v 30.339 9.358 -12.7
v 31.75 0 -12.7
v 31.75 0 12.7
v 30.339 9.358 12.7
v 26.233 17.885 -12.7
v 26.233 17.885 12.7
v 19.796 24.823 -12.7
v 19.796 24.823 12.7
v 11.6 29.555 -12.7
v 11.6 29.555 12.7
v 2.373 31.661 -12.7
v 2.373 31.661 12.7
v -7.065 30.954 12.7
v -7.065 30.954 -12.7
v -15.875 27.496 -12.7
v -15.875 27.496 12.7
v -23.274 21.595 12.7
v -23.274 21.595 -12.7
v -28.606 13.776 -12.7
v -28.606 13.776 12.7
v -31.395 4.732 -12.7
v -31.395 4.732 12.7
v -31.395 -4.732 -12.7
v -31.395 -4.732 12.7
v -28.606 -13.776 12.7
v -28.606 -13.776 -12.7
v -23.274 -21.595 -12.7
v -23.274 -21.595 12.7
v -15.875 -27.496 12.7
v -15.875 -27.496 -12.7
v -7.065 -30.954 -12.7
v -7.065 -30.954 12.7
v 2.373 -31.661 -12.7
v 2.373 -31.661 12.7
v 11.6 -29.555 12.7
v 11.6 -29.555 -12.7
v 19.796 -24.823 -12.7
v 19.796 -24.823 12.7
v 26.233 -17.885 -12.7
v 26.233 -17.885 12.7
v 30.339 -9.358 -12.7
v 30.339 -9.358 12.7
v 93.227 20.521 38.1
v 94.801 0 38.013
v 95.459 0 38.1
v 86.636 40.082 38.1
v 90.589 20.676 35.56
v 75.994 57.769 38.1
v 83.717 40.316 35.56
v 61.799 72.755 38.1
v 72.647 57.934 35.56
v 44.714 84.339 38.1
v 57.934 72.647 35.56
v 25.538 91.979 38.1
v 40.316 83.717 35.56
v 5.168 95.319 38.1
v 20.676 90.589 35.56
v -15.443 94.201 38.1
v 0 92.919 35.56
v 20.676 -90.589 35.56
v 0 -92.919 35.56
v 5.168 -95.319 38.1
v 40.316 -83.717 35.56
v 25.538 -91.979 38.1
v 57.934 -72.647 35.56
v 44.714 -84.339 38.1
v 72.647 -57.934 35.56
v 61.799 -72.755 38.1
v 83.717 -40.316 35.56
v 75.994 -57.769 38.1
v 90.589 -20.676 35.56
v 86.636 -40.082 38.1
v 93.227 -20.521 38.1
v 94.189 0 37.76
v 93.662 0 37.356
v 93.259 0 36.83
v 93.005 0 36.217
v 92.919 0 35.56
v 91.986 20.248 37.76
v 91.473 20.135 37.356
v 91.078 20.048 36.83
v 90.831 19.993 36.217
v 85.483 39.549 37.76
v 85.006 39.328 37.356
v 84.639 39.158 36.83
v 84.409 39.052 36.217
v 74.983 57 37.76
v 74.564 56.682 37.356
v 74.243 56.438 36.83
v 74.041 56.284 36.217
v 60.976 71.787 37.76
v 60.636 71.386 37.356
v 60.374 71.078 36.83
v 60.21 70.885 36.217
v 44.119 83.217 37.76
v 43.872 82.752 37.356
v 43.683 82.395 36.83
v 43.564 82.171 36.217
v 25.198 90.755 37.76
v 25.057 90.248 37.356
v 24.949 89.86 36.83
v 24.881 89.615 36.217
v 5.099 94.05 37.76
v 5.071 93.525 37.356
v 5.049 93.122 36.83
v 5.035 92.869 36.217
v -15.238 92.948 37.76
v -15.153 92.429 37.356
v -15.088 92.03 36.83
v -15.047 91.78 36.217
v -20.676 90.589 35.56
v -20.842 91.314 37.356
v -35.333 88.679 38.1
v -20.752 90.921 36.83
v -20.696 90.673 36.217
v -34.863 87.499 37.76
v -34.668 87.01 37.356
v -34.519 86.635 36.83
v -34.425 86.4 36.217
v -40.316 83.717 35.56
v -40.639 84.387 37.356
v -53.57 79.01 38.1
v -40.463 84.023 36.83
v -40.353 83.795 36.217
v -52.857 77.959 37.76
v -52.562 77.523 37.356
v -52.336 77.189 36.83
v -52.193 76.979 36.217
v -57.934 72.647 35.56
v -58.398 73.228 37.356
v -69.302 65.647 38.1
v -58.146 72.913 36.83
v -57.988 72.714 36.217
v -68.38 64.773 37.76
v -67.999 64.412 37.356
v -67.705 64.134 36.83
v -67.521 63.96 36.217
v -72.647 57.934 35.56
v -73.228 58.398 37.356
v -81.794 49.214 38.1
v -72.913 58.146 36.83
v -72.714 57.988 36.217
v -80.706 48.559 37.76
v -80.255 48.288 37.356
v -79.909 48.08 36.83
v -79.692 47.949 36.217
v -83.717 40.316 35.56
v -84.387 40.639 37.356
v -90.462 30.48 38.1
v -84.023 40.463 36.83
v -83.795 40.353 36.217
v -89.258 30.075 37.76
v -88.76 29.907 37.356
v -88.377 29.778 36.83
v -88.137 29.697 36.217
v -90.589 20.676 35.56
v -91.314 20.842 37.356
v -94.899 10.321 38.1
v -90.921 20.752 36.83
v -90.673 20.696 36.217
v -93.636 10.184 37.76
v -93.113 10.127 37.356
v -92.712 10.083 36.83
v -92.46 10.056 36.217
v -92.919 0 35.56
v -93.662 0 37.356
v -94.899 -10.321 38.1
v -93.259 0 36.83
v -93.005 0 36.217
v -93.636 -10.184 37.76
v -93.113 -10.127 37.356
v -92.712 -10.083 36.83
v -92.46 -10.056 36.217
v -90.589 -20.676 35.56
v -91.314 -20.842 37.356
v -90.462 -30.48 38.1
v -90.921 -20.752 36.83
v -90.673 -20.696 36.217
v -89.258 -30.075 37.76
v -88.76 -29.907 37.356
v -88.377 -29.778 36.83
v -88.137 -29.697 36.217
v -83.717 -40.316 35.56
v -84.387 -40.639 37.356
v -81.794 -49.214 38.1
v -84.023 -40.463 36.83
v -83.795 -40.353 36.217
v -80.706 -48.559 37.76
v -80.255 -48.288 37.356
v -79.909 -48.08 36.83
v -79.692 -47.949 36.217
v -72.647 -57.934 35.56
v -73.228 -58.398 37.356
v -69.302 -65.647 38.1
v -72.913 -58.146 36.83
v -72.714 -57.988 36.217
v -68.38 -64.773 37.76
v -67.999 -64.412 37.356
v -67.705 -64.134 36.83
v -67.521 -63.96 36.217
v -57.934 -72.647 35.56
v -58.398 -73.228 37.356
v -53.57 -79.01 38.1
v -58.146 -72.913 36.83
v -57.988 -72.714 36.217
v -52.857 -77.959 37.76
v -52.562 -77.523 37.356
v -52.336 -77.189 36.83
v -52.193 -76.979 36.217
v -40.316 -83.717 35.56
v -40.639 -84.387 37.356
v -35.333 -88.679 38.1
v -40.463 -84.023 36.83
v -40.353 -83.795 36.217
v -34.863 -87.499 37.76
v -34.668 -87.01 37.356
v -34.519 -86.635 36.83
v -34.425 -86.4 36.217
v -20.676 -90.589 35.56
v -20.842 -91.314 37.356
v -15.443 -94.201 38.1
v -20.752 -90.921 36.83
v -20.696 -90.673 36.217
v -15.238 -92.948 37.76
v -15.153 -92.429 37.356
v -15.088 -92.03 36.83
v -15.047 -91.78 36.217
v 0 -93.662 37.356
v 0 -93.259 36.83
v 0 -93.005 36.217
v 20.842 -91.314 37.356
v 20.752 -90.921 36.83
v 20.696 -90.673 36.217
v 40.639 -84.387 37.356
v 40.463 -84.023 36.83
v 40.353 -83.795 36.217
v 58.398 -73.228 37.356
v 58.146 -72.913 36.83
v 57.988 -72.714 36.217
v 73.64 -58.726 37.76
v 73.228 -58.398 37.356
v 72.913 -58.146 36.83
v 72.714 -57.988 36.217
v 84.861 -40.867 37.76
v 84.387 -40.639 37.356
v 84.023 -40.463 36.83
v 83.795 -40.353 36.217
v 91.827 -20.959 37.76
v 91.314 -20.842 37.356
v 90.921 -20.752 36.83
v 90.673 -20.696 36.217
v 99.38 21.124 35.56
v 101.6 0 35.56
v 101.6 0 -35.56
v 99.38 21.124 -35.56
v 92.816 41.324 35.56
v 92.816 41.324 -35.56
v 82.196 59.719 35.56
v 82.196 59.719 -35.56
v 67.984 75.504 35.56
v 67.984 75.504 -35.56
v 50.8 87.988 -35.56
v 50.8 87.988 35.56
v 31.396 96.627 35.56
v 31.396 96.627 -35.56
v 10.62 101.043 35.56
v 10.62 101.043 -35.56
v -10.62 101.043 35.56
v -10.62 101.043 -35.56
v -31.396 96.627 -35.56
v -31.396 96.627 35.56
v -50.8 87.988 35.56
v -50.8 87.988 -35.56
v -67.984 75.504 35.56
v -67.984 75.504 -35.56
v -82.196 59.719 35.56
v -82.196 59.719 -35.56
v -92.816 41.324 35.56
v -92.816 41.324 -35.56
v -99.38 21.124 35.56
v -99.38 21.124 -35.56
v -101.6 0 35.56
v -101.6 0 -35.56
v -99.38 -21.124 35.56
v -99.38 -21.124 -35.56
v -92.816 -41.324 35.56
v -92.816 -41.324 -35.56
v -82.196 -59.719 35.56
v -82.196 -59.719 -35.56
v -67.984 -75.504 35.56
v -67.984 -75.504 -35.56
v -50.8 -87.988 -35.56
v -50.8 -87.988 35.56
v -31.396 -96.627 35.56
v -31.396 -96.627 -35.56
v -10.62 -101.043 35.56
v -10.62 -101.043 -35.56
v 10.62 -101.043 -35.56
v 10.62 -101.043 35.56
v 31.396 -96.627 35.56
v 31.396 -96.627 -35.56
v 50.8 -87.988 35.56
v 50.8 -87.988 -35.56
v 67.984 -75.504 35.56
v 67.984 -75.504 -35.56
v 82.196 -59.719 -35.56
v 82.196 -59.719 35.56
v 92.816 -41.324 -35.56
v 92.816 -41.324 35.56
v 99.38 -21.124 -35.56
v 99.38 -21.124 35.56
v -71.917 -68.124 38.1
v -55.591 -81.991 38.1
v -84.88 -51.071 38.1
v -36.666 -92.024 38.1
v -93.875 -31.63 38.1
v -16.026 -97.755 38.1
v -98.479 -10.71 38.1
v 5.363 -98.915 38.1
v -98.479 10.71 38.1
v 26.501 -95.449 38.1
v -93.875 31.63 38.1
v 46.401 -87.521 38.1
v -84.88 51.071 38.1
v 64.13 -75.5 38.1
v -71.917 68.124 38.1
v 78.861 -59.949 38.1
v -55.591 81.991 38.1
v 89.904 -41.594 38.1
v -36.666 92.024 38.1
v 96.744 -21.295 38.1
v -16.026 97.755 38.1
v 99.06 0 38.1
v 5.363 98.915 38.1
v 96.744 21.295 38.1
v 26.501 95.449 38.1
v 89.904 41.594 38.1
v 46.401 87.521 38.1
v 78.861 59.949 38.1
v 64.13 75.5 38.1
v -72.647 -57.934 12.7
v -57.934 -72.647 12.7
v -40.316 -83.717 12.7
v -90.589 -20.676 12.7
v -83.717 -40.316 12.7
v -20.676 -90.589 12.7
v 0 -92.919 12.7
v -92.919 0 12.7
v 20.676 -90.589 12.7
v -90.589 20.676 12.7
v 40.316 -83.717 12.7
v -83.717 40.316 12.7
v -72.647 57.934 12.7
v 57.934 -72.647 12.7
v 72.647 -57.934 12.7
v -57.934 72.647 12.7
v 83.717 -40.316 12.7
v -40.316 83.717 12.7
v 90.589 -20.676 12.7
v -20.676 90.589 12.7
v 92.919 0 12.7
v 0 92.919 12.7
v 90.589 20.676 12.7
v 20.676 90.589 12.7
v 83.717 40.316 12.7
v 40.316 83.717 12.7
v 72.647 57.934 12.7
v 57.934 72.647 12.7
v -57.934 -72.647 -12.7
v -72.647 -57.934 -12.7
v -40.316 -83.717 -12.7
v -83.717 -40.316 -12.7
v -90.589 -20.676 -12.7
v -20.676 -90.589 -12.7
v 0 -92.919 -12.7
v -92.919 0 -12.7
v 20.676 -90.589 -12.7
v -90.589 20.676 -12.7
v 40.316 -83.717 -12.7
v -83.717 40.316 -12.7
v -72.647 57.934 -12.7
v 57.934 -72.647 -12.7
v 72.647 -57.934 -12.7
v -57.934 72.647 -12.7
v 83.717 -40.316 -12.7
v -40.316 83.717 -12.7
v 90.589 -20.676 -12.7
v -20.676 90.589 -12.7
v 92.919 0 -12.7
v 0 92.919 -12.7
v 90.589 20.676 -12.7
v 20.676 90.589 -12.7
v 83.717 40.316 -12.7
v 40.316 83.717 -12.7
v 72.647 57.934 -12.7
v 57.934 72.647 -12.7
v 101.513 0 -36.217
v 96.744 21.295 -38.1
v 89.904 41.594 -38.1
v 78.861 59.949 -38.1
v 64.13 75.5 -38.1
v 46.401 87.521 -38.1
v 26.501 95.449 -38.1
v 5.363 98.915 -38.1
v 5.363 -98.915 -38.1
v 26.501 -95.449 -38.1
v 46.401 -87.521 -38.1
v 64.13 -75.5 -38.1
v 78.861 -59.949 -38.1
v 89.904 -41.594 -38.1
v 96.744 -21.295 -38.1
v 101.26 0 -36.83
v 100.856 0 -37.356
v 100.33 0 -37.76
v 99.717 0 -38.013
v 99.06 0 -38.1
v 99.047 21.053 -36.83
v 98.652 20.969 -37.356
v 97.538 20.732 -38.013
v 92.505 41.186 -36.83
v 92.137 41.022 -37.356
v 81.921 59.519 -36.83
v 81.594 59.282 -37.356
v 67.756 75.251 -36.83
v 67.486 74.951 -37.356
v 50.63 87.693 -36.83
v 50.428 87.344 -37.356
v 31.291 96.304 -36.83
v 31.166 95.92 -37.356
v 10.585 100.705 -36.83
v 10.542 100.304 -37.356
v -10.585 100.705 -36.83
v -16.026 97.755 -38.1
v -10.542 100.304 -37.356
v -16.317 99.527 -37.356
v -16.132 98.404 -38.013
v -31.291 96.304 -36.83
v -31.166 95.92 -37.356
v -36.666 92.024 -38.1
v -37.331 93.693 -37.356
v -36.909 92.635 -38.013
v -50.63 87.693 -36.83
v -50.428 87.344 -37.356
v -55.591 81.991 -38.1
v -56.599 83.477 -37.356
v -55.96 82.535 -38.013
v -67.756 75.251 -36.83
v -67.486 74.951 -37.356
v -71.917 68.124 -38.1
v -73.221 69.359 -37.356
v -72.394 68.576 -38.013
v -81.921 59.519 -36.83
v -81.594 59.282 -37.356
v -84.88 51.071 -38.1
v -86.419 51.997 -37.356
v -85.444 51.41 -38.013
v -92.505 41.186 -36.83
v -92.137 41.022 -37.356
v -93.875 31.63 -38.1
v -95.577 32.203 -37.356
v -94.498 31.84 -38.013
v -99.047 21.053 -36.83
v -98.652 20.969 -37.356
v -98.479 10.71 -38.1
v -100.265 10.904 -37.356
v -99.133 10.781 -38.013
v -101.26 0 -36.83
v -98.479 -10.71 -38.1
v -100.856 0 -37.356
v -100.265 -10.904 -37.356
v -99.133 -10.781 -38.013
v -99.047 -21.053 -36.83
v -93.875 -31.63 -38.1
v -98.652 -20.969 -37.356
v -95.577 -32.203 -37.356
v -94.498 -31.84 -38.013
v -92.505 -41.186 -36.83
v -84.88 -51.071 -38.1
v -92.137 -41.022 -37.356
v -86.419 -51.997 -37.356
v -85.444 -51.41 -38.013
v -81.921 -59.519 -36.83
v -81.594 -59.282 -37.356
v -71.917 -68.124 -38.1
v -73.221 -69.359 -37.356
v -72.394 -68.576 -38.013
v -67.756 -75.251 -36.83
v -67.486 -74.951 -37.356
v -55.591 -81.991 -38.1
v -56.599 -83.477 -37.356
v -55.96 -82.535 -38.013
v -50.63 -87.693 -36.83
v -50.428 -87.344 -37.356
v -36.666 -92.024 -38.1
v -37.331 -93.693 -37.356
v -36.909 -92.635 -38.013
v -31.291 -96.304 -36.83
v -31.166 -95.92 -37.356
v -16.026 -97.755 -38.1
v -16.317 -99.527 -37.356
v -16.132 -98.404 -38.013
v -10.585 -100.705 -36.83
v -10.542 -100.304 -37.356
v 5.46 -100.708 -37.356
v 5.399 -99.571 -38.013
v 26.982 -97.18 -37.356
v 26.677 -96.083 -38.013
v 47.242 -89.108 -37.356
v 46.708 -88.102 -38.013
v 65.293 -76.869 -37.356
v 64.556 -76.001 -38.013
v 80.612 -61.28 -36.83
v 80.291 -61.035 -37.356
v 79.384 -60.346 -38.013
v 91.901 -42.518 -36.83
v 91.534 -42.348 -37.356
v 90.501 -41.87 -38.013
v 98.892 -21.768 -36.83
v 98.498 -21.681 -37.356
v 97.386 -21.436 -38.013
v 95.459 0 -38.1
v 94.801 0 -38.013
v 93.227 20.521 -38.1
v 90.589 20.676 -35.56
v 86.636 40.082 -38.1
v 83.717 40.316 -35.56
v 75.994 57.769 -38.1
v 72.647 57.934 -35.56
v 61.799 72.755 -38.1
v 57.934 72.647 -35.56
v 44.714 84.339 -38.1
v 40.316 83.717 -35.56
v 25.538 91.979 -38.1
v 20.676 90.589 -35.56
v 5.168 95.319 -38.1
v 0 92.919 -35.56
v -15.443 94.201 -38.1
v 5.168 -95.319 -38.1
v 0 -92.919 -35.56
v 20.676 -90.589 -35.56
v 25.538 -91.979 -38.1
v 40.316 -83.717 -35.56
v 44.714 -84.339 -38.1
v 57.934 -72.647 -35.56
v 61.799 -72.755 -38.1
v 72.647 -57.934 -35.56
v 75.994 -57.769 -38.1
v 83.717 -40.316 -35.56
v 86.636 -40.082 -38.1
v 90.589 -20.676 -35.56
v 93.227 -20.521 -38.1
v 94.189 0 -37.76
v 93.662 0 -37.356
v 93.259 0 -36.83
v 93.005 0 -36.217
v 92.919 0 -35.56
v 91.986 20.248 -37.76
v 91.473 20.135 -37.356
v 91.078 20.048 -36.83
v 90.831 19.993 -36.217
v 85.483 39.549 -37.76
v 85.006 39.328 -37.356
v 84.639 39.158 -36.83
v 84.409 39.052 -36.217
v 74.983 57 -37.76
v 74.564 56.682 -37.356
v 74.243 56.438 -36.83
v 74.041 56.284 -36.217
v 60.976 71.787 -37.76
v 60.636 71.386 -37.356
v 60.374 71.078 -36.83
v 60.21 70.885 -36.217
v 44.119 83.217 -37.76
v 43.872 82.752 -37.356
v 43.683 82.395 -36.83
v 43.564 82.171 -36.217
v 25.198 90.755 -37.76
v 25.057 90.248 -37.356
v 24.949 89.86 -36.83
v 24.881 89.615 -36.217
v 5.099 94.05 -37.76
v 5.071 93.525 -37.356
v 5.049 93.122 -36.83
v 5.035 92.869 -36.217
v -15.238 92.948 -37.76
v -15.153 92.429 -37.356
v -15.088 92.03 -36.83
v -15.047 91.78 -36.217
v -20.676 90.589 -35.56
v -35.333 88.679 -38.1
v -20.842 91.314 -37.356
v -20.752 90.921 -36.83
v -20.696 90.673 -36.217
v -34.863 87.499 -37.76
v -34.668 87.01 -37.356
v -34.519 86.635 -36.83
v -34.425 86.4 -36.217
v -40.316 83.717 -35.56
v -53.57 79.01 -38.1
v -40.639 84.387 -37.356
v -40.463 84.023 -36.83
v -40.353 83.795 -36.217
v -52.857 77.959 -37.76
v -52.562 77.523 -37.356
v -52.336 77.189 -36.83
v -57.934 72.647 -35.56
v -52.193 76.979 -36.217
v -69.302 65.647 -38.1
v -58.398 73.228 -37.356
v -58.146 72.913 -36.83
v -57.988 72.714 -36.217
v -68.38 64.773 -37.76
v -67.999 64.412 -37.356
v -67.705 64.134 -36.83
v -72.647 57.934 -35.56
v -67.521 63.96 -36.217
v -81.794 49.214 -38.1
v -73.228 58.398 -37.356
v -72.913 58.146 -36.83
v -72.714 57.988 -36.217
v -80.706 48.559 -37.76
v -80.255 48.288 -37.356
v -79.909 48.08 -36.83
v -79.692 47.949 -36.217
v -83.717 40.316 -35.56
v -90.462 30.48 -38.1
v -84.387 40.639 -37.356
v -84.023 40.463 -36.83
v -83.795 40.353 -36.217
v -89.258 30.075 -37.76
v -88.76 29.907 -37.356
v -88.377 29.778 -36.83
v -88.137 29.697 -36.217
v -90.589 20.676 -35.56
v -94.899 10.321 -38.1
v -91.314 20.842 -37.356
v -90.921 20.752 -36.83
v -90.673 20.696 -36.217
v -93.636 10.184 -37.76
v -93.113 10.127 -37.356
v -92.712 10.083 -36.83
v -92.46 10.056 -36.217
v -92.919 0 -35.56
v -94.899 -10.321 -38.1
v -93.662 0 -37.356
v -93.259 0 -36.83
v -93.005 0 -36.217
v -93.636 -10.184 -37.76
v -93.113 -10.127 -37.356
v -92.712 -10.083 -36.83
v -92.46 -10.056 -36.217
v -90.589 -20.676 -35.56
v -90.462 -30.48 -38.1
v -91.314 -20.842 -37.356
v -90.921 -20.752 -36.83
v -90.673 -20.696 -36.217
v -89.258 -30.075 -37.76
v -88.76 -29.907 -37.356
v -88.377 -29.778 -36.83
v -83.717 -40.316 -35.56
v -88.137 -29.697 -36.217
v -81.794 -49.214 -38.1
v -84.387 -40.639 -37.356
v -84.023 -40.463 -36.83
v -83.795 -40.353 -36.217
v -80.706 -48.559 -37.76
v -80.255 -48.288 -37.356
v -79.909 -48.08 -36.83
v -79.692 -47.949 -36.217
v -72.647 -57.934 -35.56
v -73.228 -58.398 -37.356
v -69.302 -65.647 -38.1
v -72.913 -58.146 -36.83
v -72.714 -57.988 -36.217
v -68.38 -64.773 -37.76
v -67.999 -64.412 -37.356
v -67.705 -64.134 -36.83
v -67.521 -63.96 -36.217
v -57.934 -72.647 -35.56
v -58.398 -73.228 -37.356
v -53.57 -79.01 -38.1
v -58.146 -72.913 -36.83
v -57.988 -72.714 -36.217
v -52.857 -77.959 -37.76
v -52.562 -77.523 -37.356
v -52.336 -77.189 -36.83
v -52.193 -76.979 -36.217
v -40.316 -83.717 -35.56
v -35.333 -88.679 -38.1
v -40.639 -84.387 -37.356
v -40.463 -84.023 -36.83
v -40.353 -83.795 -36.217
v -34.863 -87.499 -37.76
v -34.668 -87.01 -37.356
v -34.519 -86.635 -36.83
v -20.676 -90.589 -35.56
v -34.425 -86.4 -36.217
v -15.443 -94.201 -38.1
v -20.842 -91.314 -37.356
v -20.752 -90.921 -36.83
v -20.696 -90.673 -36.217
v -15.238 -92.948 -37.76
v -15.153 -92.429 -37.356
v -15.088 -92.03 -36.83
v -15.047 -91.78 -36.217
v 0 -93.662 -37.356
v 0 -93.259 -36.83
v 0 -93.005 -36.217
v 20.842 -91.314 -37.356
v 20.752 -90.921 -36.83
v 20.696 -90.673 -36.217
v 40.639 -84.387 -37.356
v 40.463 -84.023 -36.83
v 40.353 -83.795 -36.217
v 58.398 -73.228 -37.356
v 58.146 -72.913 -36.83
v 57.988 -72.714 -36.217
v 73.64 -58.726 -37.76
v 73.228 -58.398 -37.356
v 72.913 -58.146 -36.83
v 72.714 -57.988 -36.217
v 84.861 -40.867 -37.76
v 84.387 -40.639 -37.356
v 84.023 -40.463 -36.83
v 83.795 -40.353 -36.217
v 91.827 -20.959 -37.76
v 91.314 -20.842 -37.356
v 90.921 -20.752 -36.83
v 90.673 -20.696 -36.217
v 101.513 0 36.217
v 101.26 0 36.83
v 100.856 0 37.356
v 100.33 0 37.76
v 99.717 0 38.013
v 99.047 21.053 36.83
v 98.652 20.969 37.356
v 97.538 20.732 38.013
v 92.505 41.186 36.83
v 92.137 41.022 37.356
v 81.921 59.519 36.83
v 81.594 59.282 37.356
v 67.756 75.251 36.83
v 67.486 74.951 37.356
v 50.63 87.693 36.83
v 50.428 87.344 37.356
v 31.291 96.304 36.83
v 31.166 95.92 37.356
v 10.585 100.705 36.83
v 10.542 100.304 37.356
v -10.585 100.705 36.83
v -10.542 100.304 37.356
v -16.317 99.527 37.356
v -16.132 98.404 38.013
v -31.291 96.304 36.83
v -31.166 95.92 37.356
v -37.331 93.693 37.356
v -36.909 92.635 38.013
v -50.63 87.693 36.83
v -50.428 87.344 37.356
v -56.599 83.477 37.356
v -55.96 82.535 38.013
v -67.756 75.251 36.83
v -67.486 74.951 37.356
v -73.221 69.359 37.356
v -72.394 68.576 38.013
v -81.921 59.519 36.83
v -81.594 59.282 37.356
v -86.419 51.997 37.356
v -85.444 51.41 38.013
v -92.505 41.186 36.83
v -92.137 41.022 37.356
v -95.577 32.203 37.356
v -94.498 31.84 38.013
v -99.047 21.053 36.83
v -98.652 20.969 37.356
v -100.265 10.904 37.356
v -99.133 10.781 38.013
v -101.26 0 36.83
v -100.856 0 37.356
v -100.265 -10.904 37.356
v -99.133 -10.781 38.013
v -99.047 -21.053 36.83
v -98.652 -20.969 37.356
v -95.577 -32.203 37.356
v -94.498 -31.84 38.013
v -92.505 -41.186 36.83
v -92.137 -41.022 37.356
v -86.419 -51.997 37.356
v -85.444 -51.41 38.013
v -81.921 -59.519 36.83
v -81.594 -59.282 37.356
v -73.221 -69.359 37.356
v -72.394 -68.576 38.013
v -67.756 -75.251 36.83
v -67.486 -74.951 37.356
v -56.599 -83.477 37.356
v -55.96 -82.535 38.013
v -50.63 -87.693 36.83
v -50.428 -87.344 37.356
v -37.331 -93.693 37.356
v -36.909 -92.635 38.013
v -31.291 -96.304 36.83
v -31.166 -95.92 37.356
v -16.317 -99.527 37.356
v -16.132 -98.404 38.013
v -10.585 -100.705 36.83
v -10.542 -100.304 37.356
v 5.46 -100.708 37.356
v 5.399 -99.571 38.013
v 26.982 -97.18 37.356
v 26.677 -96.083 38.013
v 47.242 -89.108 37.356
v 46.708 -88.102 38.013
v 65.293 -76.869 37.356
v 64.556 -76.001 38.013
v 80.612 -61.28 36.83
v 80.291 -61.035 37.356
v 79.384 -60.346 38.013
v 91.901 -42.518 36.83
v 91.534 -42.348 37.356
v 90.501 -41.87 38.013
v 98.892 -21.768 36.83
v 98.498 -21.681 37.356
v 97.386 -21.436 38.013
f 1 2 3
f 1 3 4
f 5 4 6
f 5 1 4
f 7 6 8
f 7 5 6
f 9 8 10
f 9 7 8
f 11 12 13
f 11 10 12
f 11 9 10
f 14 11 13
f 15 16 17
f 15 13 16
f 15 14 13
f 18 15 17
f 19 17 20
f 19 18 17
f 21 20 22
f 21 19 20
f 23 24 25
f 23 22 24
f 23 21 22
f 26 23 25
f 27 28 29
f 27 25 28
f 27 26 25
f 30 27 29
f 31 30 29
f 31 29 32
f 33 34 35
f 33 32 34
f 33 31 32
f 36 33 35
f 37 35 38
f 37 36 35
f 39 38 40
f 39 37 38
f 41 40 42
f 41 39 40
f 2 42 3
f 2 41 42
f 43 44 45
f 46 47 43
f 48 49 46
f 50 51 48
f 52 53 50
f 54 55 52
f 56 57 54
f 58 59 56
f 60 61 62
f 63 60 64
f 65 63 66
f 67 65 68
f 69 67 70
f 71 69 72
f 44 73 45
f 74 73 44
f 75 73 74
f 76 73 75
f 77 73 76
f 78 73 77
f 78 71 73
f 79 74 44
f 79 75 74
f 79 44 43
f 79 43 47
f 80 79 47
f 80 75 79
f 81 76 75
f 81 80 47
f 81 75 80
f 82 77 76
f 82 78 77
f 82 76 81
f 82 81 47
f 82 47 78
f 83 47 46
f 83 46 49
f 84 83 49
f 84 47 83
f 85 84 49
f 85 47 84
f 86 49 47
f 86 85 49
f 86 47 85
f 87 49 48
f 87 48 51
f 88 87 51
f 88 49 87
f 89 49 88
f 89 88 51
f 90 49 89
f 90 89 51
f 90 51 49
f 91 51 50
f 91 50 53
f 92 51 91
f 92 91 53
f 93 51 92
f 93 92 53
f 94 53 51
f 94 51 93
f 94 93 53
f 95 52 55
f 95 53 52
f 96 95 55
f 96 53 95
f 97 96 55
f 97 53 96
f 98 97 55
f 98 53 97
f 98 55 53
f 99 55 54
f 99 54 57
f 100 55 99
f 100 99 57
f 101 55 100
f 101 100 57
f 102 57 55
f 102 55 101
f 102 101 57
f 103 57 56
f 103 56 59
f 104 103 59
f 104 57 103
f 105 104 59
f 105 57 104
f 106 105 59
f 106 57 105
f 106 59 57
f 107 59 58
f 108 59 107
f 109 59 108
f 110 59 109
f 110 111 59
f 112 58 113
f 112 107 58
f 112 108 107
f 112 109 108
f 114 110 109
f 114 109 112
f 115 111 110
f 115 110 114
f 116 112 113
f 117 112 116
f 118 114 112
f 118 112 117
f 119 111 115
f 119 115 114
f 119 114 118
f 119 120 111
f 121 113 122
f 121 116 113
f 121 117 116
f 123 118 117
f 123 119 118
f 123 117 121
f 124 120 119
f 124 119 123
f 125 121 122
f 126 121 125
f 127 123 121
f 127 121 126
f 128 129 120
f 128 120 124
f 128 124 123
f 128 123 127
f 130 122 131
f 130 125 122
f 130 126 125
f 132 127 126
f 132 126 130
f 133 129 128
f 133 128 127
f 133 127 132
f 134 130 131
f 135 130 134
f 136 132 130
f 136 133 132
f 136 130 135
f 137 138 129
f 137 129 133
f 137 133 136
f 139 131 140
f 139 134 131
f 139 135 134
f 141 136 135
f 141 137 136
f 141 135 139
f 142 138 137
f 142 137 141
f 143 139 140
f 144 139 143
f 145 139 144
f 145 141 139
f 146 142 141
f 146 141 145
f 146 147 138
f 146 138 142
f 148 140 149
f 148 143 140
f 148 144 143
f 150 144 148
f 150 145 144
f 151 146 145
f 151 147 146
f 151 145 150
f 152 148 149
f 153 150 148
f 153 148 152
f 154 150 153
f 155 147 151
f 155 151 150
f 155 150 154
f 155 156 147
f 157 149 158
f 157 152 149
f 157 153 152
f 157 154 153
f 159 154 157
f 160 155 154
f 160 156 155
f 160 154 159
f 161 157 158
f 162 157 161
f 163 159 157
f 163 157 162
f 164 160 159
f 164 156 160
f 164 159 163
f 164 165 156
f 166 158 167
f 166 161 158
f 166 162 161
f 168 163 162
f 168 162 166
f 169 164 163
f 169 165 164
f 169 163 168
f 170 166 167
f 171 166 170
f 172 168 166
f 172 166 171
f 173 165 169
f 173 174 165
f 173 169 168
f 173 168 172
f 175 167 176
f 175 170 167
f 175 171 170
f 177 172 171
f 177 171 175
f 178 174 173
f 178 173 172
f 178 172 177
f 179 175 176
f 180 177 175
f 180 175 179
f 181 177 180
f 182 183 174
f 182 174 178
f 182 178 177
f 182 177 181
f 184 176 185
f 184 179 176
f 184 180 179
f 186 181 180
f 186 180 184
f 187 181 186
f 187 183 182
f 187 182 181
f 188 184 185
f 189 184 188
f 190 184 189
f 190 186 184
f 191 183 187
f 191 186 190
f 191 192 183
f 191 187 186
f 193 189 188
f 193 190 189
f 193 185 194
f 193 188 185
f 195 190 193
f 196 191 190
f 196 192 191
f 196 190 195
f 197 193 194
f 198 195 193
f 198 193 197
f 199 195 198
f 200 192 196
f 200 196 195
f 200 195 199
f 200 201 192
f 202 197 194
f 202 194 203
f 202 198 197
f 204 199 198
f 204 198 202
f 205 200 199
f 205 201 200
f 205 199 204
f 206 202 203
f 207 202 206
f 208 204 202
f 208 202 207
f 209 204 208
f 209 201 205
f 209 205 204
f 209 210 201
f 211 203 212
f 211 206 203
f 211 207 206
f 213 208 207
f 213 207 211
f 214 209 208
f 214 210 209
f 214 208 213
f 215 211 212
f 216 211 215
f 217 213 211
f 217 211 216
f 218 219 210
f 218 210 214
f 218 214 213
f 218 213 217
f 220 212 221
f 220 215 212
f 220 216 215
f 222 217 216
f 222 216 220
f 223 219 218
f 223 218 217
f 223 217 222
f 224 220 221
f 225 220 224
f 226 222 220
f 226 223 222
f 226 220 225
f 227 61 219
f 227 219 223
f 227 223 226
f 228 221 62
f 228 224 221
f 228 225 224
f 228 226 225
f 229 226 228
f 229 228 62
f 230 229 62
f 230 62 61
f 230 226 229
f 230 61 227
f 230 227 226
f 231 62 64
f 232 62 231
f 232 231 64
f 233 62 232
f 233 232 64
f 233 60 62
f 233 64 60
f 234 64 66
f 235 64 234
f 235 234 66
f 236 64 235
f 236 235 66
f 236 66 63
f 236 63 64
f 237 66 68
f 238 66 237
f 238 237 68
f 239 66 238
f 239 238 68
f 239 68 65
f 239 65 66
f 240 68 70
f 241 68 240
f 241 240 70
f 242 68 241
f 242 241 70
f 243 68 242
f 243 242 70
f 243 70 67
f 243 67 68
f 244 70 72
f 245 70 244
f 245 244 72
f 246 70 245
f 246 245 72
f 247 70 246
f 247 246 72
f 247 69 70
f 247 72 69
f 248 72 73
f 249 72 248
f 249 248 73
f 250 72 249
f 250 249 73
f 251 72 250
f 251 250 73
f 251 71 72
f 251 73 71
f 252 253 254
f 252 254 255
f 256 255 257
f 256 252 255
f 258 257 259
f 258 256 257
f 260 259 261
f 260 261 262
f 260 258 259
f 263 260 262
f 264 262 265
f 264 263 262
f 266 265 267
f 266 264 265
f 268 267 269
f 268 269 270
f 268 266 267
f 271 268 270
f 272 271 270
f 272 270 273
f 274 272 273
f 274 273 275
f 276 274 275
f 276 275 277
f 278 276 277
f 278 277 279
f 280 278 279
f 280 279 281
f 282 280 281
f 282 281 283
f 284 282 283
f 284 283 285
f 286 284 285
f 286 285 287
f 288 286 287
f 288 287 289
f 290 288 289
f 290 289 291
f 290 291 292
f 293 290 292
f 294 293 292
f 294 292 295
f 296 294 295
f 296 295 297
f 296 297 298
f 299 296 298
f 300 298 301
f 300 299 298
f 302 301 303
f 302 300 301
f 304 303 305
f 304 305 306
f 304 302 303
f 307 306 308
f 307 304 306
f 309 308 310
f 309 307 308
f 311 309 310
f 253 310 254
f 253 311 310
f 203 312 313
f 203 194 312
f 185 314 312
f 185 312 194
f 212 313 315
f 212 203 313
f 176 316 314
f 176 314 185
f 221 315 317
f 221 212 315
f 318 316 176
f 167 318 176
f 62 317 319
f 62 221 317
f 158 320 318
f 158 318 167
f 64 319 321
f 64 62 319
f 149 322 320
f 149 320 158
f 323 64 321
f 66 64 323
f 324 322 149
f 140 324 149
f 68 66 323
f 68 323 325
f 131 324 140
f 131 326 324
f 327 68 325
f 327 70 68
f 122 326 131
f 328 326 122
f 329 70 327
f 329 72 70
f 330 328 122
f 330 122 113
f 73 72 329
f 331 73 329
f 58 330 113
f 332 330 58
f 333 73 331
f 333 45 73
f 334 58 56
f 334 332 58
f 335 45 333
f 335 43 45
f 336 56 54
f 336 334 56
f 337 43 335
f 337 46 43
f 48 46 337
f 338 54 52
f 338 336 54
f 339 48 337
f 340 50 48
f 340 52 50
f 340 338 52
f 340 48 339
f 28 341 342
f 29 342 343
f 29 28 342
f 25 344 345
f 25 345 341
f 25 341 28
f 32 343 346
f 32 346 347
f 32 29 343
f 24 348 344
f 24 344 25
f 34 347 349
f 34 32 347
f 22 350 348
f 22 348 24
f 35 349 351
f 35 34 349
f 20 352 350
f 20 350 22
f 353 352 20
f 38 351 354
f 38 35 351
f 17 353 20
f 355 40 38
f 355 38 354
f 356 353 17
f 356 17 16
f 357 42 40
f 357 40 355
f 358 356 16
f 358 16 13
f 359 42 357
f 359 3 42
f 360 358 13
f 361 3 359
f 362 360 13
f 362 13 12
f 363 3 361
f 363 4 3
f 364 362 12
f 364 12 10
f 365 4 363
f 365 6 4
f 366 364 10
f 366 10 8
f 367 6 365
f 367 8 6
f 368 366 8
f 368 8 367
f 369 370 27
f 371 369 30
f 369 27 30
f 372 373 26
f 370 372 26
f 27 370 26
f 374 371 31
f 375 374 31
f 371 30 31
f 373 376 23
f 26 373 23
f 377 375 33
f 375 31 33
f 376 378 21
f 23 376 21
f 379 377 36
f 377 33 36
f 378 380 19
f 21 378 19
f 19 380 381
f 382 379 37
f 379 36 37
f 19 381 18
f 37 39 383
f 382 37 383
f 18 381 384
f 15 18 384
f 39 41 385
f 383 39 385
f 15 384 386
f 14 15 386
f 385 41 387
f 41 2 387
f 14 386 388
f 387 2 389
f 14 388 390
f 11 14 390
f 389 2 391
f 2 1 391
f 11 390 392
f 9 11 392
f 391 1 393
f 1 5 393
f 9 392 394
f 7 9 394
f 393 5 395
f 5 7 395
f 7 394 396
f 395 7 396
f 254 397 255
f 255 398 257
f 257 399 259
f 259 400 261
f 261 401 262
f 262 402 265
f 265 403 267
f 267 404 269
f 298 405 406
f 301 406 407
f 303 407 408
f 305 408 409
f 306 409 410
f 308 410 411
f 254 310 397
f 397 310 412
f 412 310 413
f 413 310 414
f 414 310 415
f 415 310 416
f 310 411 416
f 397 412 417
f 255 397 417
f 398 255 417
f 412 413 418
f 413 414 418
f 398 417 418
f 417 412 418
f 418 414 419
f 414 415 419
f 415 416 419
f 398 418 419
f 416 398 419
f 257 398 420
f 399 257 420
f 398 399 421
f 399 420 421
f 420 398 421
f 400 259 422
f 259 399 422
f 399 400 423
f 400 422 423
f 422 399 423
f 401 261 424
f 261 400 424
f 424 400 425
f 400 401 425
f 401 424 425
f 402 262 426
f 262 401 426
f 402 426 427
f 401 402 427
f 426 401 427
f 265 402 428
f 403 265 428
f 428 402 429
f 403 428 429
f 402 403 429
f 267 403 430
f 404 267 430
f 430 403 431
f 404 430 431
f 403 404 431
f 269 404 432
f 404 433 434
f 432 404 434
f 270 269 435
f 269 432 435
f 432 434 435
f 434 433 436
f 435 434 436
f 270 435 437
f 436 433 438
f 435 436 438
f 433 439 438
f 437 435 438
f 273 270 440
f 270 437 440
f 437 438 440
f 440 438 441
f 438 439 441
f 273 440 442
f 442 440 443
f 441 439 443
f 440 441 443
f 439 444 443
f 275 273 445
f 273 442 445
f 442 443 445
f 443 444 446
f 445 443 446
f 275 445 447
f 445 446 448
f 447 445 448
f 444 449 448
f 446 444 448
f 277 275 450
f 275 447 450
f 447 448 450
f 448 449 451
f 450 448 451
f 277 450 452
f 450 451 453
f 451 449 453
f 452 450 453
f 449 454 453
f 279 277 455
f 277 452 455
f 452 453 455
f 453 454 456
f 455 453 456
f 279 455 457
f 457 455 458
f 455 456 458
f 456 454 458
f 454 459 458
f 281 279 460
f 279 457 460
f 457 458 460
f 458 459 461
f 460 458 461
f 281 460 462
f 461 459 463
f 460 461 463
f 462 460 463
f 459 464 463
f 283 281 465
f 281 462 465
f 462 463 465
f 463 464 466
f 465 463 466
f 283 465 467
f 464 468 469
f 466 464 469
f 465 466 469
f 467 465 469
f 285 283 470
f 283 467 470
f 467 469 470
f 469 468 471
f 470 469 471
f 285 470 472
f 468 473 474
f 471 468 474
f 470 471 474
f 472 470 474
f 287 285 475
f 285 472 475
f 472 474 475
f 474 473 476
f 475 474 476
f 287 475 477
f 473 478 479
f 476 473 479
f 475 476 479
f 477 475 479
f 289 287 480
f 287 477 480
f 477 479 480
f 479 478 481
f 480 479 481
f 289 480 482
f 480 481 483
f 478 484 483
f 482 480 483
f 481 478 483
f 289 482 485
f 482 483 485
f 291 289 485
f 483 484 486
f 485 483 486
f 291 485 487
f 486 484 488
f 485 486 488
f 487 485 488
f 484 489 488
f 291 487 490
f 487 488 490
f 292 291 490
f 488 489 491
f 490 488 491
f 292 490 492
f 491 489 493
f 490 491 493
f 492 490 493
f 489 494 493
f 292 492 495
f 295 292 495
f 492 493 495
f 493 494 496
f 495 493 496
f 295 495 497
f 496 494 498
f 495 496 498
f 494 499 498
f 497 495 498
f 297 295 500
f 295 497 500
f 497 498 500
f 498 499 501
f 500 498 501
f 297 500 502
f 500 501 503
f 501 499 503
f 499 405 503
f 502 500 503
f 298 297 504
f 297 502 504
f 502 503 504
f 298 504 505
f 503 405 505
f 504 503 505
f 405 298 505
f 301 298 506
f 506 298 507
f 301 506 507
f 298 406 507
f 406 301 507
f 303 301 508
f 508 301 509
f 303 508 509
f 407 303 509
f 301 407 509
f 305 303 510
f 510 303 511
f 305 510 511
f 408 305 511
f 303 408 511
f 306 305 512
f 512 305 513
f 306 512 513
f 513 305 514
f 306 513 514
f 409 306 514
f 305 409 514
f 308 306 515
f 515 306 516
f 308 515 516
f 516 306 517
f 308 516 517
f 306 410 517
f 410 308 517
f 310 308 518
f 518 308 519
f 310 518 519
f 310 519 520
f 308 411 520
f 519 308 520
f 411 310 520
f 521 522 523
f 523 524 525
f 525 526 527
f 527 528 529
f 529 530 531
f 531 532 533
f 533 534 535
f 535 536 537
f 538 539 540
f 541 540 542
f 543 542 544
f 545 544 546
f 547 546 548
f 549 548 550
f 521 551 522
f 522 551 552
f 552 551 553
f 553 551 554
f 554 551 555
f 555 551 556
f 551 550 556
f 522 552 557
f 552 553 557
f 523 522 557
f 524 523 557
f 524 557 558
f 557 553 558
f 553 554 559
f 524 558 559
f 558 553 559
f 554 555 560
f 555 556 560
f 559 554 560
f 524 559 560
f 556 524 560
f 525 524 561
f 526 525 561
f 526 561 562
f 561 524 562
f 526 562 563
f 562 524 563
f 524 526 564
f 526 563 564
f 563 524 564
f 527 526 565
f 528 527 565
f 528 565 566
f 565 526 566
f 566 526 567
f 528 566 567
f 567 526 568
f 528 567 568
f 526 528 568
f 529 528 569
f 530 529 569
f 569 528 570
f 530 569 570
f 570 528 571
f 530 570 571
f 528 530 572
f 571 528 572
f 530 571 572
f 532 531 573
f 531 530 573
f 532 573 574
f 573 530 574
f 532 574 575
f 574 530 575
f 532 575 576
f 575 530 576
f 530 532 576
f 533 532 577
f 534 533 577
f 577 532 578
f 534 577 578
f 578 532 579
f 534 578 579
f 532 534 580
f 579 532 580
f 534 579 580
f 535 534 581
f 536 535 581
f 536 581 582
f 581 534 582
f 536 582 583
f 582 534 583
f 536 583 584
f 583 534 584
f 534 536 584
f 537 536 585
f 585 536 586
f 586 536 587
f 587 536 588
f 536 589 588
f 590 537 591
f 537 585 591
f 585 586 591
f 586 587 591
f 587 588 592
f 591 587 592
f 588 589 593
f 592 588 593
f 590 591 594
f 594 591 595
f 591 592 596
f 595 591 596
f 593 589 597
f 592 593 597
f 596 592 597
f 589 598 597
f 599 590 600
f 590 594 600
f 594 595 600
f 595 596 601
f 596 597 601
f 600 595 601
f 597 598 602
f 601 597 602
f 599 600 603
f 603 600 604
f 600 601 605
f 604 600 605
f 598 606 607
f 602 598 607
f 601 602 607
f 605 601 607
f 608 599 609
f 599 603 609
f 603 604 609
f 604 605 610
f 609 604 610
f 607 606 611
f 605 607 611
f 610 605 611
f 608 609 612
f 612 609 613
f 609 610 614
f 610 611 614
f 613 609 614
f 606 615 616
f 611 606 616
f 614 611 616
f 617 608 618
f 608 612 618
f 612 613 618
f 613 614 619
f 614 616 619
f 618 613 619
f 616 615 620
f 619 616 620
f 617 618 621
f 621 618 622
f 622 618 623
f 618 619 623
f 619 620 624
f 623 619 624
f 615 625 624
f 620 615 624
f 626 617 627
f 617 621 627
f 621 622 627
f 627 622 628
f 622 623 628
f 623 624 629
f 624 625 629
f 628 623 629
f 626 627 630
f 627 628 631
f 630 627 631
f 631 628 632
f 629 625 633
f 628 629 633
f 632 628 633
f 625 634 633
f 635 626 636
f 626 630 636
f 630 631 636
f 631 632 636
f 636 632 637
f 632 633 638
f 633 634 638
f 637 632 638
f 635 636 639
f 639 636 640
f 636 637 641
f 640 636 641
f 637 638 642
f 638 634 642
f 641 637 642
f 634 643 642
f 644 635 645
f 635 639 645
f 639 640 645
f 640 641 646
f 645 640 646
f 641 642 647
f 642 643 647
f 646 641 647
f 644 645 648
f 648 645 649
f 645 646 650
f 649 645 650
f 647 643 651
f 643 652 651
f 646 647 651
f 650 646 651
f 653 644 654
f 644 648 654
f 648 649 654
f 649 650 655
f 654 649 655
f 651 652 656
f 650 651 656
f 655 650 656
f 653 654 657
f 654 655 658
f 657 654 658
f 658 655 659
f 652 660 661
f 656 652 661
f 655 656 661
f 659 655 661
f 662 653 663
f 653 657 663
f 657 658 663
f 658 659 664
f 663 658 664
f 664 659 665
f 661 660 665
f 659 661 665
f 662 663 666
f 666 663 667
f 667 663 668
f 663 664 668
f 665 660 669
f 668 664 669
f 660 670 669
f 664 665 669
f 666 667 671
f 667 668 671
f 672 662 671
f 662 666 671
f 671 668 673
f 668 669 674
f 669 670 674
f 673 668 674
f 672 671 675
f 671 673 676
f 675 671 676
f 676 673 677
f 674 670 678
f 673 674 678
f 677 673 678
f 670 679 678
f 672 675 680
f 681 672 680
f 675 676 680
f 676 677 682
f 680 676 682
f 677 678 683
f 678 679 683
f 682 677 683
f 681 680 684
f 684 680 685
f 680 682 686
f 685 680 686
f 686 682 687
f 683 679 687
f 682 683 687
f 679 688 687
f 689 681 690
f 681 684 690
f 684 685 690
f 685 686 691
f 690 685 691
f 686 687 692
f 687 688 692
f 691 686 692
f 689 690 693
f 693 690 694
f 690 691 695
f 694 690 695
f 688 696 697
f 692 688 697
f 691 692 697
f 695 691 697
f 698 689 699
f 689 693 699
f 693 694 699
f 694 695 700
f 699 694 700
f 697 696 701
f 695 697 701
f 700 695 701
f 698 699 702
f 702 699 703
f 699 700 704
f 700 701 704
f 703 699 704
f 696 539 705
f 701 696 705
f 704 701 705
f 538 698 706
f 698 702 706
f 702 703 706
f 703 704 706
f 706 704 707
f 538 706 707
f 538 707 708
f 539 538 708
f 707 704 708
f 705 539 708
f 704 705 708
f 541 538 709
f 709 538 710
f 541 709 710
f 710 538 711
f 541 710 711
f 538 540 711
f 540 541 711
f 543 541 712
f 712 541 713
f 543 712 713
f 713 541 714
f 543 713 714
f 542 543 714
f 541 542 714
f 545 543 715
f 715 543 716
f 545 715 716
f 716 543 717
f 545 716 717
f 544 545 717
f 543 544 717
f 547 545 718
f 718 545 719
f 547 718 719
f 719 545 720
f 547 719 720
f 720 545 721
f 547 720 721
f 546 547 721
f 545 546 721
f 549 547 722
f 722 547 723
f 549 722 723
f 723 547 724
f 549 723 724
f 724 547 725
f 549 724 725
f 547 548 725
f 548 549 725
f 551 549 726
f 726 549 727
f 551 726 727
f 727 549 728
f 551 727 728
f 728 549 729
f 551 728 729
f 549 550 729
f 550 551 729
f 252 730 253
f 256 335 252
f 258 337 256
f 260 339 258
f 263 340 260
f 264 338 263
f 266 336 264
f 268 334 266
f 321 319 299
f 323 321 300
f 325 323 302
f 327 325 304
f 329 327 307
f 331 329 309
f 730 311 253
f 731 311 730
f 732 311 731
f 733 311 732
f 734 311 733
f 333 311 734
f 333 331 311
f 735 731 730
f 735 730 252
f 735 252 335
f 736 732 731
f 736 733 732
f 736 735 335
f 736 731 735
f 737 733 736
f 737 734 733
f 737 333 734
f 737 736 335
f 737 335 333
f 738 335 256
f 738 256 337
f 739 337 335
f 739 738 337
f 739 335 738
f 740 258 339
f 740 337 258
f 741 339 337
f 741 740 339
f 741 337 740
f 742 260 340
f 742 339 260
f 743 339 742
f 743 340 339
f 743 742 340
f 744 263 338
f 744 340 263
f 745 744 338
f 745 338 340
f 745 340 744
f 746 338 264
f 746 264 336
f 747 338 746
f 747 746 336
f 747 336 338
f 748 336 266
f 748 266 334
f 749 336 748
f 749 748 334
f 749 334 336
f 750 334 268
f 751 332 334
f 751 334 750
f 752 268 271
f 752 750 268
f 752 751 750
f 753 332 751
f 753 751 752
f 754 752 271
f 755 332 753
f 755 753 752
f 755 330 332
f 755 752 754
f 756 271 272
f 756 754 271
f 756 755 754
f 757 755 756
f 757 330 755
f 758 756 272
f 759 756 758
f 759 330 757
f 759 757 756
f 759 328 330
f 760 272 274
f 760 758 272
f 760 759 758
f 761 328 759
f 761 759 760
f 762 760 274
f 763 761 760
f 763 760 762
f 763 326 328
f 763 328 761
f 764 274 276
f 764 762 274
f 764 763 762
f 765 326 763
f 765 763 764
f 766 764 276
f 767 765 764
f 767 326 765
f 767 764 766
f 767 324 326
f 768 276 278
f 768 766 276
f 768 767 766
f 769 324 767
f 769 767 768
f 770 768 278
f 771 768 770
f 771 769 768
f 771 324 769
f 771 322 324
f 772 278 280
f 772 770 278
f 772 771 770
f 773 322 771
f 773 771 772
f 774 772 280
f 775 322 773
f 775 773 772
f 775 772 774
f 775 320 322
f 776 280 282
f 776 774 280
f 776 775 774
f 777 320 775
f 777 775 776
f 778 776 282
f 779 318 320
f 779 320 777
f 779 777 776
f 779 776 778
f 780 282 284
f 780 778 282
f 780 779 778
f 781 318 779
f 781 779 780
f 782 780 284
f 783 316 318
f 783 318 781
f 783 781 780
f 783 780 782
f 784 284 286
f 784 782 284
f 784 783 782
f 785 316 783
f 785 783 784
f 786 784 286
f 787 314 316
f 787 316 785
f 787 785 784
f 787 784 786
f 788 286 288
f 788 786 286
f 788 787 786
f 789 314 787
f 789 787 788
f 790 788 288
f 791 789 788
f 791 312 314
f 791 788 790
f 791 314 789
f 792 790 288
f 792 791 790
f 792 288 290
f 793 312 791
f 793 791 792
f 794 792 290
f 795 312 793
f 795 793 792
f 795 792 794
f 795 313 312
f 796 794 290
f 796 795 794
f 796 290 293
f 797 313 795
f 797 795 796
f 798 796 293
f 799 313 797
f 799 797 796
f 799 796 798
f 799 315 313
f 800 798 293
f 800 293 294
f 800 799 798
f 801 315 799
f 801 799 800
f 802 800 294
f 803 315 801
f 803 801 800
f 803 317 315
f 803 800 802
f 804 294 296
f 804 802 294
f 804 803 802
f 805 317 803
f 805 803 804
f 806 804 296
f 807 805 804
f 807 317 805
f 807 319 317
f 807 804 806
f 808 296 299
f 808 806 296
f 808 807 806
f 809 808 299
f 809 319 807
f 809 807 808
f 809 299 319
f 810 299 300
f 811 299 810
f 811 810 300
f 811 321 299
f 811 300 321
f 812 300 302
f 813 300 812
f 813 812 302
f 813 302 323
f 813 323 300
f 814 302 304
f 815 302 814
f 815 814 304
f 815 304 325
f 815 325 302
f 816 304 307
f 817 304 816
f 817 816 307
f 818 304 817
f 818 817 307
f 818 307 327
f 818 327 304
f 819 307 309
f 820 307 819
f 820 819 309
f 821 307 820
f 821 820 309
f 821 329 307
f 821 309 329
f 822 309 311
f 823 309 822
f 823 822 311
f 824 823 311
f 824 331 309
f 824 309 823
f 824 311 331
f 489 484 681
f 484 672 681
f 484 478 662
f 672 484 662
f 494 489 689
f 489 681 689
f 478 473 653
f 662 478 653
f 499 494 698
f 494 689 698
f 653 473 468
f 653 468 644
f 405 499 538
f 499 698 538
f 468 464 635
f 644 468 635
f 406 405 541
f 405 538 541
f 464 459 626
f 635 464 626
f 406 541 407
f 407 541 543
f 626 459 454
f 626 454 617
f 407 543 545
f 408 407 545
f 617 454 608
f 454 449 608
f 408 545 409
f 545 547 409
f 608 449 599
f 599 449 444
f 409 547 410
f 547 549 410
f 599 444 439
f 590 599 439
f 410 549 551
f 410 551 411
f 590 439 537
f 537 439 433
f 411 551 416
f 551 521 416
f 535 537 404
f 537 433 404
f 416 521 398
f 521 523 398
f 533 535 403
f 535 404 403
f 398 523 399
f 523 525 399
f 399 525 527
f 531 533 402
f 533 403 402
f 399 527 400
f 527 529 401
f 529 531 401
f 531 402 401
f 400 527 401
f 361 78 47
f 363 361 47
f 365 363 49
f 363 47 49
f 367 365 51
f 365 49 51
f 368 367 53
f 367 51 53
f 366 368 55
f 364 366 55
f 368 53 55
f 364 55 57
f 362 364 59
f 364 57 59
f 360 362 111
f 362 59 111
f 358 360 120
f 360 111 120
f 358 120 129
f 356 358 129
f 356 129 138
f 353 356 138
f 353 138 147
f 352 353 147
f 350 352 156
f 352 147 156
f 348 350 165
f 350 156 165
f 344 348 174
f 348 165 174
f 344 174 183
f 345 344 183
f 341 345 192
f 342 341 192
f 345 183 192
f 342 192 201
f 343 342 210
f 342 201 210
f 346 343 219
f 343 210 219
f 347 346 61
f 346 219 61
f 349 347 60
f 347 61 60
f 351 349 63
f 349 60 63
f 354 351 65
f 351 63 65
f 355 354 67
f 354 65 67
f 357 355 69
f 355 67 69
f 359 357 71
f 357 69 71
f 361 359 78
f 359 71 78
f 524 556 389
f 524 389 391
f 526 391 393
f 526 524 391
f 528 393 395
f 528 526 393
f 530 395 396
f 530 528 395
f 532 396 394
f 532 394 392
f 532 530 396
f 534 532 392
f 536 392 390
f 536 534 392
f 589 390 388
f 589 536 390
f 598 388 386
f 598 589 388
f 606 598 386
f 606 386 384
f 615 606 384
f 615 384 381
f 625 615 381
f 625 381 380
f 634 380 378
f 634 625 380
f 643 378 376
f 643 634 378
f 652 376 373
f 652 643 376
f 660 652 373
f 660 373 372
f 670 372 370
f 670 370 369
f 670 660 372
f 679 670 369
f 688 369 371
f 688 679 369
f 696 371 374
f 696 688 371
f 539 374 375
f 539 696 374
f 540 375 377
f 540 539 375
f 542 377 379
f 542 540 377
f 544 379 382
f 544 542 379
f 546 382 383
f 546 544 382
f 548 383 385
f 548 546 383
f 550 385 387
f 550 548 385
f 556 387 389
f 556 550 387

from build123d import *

# Parameters (mm, degrees)
SKETCH1_R           = 101.6
SKETCH1_R_2         = 31.75
BOSS_EXTRUDE1_DEPTH = 38.1
SKETCH2_R           = 92.918511566
CUT_EXTRUDE1_DEPTH  = 25.4
FILLET1_R           = 2.54
FILLET2_R           = 2.54


with BuildPart() as part:
    # Sketch1 → Boss-Extrude1 (new, symmetric)
    with BuildSketch(Plane.XY):
        Circle(SKETCH1_R)
        Circle(SKETCH1_R_2, mode=Mode.SUBTRACT)
    extrude(amount=BOSS_EXTRUDE1_DEPTH, both=True)

    # Sketch2 → Cut-Extrude1 (cut)
    with BuildSketch(Plane.XY.offset(38.1)):
        Circle(SKETCH2_R)
    cut_extrude1 = extrude(amount=-CUT_EXTRUDE1_DEPTH, mode=Mode.SUBTRACT)

    # Mirror1: Cut-Extrude1 across plane
    add(cut_extrude1.mirror(Plane.XY), mode=Mode.SUBTRACT)

    # Fillet1
    fillet1_edges = [part.edges().sort_by_distance(p)[0] for p in [
        (-92.918511566, 0, -38.1),
        (-101.6, 0, -38.1),
    ]]
    fillet(fillet1_edges, radius=FILLET1_R)

    # Fillet2
    fillet2_edges = [part.edges().sort_by_distance(p)[0] for p in [
        (-92.918511566, 0, 38.1),
        (-101.6, 0, 38.1),
    ]]
    fillet(fillet2_edges, radius=FILLET2_R)


solid = part.part
